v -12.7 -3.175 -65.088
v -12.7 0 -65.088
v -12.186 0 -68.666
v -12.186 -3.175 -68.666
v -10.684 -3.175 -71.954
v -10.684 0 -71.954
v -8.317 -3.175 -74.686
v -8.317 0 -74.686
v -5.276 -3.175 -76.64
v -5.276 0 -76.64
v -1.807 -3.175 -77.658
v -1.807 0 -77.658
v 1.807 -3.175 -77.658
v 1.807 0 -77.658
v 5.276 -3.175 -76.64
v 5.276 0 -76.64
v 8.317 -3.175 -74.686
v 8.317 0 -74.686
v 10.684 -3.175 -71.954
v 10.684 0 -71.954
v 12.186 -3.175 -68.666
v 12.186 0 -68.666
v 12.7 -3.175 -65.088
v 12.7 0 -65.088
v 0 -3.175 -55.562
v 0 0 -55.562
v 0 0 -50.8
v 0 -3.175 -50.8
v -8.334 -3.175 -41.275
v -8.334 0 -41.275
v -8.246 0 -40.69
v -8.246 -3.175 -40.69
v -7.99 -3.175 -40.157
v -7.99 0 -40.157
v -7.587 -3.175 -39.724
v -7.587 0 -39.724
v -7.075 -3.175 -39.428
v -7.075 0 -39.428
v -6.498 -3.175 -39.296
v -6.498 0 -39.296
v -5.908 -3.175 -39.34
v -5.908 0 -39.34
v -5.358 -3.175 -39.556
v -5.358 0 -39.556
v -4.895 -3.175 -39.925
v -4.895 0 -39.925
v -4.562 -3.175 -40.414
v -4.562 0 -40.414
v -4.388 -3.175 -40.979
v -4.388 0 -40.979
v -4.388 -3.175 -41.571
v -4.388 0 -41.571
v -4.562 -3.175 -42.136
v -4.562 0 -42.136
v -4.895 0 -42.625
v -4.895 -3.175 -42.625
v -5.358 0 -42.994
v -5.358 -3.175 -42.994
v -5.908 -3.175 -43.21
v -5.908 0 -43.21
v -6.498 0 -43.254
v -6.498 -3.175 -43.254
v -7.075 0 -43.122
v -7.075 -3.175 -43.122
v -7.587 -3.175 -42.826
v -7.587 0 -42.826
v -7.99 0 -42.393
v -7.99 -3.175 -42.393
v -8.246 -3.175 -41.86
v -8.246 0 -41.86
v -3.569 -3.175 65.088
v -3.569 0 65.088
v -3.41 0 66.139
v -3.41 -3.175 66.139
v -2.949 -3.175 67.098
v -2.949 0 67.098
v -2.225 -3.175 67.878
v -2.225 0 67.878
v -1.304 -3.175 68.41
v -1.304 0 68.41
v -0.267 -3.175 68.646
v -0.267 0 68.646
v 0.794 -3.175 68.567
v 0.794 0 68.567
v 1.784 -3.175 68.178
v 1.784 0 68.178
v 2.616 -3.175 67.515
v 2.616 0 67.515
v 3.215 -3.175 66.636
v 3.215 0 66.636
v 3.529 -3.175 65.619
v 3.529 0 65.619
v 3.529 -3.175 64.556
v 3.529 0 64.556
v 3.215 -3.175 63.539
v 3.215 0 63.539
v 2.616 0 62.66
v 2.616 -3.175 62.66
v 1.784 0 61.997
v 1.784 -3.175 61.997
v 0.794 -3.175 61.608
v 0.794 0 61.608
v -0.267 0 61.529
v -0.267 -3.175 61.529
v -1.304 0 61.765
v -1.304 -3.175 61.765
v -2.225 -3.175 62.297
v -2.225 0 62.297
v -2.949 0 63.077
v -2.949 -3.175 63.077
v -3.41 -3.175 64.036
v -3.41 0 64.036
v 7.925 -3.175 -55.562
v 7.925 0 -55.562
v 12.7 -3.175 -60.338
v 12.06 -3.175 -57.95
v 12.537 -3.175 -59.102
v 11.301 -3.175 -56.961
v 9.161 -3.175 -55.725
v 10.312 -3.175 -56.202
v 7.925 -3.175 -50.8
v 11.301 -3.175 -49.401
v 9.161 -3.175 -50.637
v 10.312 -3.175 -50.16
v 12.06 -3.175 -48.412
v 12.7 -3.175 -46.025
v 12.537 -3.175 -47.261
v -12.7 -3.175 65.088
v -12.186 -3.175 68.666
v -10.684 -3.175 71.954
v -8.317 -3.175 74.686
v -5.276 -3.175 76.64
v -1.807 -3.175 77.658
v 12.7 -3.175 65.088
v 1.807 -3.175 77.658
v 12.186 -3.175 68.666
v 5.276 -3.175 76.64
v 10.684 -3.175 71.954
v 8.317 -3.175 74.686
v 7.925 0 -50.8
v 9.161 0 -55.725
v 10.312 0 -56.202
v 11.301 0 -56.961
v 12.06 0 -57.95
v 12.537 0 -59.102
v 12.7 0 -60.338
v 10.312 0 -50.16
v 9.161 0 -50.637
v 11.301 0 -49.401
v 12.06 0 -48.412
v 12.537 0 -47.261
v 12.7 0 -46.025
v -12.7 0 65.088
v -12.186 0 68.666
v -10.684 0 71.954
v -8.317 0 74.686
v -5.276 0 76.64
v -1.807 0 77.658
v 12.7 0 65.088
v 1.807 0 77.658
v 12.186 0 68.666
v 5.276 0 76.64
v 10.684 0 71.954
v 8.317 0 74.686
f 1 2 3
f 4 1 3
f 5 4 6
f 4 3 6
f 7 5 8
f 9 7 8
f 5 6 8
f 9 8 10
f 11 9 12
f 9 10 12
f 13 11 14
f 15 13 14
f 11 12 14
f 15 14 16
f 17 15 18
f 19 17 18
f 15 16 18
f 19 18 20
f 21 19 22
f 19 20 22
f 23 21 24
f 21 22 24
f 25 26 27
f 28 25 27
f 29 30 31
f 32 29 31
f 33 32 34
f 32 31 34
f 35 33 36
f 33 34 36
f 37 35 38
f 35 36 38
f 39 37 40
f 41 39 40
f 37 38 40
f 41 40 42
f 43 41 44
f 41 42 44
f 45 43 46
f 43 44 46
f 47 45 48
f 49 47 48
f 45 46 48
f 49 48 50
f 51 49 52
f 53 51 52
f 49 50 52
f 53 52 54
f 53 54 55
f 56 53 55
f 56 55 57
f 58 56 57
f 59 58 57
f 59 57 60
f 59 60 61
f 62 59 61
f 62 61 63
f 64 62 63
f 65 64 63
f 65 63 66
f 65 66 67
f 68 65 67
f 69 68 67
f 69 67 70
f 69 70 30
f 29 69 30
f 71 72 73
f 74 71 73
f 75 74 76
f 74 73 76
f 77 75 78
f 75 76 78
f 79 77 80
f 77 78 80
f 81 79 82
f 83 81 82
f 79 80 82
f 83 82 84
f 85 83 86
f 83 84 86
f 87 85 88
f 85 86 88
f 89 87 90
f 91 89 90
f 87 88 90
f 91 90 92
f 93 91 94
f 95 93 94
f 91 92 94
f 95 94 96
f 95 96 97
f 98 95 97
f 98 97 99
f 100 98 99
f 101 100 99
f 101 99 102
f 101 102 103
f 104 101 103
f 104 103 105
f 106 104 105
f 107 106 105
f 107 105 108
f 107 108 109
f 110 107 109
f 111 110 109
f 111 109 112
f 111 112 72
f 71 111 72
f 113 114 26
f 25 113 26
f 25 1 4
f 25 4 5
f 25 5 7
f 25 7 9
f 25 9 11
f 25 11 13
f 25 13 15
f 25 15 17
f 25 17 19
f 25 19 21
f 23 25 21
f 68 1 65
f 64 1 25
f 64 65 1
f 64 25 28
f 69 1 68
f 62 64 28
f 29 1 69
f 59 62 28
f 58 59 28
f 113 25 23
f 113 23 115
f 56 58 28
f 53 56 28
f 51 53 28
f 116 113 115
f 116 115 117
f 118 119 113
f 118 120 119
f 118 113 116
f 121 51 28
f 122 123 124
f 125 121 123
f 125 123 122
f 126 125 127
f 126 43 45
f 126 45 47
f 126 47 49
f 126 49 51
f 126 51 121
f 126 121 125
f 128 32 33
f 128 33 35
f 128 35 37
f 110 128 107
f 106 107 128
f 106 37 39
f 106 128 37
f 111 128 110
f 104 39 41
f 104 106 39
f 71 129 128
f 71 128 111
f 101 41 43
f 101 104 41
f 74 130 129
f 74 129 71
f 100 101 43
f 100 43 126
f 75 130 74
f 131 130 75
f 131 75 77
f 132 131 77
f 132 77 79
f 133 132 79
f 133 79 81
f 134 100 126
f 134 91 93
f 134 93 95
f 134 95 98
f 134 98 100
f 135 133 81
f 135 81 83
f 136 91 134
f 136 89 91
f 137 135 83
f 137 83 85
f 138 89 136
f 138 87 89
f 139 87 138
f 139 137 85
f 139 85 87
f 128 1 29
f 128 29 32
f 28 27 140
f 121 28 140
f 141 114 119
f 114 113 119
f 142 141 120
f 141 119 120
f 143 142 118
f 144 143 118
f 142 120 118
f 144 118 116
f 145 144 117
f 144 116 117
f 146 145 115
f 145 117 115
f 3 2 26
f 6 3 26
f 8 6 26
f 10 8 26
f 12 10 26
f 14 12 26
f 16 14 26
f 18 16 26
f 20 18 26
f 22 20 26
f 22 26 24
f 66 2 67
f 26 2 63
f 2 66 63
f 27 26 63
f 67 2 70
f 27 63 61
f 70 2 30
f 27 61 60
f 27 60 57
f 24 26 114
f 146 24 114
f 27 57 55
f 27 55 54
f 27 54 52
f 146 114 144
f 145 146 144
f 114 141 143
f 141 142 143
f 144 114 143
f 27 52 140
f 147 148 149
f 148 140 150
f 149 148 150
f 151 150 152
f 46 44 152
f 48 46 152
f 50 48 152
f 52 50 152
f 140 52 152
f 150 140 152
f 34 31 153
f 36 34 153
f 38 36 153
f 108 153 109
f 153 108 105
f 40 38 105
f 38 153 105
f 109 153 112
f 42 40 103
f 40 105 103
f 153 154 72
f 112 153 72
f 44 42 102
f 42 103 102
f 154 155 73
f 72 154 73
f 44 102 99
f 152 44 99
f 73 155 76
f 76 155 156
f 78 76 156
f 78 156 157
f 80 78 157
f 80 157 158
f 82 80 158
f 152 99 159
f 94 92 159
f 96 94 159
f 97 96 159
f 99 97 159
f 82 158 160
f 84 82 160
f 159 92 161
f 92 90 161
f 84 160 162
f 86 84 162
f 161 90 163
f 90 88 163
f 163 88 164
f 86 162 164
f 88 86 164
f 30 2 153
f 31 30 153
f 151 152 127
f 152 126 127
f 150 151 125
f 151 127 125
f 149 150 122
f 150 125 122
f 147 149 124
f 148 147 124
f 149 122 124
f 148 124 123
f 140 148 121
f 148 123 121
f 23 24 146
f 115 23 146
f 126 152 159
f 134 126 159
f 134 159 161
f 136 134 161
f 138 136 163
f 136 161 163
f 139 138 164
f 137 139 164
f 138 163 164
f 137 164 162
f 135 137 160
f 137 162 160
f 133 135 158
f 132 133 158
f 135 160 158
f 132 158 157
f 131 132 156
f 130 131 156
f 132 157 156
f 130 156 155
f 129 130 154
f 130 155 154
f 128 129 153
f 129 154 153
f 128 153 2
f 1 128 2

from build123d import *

# Parameters (mm, degrees)
F1_DEPTH = 3.175
F3_D     = 7.1374
F5_D     = 3.96875
F6_R     = 4.7752


with BuildPart() as f1:
    # F0 (on Front) → F1 (new body)
    with BuildSketch(Plane.XZ):
        with BuildLine():
            Line((12.7, -50.8), (12.7, 65.0875))
            ThreePointArc((12.7, 65.0875), (0, 77.7875), (-12.7, 65.0875))
            Line((-12.7, 65.0875), (-12.7, -65.0875))
            ThreePointArc((-12.7, -65.0875), (0, -77.7875), (12.7, -65.0875))
            Line((12.7, -65.0875), (12.7, -55.5625))
            Line((12.7, -55.5625), (0, -55.5625))
            Line((0, -55.5625), (0, -50.8))
            Line((0, -50.8), (12.7, -50.8))
        make_face()
    extrude(amount=F1_DEPTH)

    # F3 (through all)
    with Locations(Plane.XZ.offset(3.175)):
        with Locations((0, 65.0875)):
            Hole(F3_D / 2)

    # F5 (through all)
    with Locations(Plane.XZ.offset(3.175)):
        with Locations((-6.35, -41.275)):
            Hole(F5_D / 2)

    # F6
    f6_edges = [f1.edges().sort_by_distance(p)[0] for p in [
        (12.7, -1.5875, -55.5625),
        (12.7, -1.5875, -50.8),
    ]]
    fillet(f6_edges, radius=F6_R)


solid = f1.part
